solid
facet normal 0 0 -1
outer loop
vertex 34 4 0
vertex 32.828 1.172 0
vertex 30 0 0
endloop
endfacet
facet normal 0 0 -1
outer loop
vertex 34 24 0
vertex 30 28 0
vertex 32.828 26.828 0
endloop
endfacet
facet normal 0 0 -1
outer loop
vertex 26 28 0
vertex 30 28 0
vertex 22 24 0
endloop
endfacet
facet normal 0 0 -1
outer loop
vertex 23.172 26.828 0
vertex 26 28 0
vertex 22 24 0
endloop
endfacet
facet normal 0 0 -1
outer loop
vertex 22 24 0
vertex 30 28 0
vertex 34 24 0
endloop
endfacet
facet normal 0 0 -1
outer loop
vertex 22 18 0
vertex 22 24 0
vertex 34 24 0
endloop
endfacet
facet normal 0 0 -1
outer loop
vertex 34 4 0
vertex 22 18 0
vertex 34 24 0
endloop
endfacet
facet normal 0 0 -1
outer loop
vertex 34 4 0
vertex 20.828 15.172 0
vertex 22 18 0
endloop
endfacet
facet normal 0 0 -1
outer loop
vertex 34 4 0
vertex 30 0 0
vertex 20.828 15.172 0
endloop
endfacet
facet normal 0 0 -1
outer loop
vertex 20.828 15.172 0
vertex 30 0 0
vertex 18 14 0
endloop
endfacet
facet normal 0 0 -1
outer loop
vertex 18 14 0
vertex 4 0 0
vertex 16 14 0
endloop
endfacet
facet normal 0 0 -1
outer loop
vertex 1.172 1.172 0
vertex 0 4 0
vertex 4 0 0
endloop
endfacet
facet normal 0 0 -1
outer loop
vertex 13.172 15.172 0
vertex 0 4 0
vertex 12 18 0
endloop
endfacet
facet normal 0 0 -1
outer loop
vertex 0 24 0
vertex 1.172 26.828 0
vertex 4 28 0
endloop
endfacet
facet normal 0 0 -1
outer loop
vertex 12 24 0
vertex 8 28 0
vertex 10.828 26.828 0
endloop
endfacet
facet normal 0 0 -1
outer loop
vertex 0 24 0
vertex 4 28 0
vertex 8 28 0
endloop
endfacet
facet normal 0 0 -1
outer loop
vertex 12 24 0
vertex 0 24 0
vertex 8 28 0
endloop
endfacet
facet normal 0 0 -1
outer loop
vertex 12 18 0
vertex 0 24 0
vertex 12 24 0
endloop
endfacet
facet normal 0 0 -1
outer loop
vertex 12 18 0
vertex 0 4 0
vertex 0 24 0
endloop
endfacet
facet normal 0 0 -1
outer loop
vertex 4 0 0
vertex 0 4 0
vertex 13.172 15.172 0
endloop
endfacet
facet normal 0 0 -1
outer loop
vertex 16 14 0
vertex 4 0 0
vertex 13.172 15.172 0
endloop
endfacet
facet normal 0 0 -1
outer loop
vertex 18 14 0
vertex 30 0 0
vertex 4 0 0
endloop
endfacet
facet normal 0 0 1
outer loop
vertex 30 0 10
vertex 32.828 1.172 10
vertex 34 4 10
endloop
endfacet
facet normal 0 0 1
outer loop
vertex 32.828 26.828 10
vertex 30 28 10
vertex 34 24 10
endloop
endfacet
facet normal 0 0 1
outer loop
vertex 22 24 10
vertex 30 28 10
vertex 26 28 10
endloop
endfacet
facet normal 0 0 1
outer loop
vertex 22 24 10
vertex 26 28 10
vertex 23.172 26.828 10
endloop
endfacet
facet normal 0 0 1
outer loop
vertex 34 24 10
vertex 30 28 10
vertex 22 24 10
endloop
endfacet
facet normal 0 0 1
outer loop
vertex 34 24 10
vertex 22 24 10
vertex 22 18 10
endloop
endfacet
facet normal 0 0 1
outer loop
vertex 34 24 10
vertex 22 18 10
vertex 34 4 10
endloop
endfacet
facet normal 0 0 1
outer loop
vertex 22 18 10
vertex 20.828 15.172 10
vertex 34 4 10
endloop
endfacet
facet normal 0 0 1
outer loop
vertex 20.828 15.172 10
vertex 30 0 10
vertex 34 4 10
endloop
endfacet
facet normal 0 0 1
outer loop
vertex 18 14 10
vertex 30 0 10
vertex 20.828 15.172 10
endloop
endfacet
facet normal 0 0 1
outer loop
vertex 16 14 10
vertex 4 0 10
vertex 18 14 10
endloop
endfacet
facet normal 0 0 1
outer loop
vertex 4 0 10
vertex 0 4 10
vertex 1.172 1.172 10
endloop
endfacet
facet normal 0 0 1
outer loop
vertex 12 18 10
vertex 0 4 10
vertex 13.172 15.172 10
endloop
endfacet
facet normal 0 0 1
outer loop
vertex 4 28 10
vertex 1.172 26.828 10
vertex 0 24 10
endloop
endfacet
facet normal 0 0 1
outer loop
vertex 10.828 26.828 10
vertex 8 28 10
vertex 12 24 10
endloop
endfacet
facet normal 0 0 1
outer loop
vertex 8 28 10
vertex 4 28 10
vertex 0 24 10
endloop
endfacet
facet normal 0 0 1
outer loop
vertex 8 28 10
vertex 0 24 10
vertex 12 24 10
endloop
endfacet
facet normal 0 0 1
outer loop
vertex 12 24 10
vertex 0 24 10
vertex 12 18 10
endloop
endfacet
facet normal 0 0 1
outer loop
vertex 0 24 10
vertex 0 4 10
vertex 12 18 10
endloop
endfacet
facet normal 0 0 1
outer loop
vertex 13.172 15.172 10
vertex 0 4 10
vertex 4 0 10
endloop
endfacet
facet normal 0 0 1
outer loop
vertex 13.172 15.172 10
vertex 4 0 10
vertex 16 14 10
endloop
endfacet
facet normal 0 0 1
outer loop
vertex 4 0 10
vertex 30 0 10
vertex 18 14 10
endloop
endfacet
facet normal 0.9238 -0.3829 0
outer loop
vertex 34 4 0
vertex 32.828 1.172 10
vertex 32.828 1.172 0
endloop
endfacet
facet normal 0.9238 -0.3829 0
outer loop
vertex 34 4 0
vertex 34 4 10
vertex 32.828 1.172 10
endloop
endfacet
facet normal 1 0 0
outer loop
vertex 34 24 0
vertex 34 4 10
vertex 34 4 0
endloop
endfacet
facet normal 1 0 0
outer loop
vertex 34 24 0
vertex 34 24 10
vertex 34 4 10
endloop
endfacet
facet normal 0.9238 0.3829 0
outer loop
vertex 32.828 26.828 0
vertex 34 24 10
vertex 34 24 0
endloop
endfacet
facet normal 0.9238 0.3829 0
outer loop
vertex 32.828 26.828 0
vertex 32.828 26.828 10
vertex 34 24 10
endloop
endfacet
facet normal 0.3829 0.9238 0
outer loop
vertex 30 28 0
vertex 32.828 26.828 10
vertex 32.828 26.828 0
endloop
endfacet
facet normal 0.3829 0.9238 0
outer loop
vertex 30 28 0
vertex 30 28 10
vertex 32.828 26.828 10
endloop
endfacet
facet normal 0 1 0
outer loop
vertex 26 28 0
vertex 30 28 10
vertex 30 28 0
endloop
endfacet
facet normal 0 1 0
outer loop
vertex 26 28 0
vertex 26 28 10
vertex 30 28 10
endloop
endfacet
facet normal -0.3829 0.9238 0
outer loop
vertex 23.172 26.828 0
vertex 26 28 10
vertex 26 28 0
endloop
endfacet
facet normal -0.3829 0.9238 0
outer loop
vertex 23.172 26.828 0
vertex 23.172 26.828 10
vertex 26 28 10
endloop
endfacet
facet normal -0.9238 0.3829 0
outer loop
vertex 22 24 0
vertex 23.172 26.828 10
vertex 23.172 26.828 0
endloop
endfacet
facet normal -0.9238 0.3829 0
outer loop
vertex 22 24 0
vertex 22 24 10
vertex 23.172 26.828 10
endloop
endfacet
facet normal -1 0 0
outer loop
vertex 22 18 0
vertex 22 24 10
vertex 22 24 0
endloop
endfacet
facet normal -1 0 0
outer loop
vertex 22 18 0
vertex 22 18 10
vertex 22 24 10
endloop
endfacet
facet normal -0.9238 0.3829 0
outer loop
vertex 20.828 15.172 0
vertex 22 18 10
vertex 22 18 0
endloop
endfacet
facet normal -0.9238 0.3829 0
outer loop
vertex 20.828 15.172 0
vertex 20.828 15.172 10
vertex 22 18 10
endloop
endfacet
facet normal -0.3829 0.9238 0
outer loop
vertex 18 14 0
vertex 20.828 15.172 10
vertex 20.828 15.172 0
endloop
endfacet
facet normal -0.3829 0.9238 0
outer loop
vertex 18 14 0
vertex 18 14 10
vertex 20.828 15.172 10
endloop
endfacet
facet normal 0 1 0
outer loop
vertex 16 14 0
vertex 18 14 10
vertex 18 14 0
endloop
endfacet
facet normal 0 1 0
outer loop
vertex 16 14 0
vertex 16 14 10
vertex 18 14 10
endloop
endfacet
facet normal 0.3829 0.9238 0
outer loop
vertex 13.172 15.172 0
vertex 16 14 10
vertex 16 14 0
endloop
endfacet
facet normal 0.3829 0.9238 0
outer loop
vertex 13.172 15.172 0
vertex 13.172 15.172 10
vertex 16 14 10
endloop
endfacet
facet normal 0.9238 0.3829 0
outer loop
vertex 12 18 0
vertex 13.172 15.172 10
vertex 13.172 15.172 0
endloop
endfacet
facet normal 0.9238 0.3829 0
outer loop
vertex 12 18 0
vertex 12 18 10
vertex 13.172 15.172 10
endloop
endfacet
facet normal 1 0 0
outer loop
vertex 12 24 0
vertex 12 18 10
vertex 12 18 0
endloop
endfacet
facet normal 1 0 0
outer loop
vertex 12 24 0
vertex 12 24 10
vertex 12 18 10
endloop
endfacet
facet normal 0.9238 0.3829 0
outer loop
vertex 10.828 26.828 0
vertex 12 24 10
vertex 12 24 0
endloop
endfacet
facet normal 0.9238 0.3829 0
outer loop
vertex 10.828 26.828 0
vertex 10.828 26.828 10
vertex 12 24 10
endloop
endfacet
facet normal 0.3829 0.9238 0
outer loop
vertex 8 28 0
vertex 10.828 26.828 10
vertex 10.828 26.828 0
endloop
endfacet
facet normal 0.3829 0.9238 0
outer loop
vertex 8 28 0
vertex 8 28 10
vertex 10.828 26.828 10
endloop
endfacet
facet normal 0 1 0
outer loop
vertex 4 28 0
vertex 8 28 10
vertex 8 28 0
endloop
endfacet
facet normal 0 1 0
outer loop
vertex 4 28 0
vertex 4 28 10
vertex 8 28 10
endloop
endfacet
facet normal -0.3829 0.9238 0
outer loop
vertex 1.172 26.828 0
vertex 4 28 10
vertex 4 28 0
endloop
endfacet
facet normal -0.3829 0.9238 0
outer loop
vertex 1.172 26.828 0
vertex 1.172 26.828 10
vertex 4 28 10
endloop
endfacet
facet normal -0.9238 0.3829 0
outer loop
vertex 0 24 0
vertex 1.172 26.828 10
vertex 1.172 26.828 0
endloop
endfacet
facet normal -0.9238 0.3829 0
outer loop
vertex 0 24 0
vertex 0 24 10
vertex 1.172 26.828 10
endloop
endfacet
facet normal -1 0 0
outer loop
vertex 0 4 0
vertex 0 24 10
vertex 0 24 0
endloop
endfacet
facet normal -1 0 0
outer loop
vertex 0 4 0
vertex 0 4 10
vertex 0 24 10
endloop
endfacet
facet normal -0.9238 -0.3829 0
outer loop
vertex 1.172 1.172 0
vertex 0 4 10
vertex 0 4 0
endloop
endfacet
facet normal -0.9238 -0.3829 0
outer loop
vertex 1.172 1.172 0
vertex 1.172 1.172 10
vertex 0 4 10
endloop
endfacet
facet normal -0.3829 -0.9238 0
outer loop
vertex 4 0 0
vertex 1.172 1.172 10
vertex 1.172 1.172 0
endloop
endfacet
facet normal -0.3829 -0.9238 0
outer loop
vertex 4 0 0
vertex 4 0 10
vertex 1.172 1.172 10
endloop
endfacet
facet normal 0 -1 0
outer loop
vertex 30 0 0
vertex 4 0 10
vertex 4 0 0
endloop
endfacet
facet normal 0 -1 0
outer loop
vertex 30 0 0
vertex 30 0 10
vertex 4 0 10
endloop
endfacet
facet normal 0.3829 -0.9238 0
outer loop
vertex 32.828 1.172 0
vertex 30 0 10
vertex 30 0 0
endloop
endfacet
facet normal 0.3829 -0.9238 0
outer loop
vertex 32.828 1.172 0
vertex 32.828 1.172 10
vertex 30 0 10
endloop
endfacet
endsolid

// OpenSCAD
$fn = 32;

// ----------------------------------------------------------------------
// Eye lug: clevis, 10 mm thick
// ----------------------------------------------------------------------

// --- parameters (mm) ---
profile_height = 10;      // extrusion height
profile_points = 24;      // points of the closed outline

profile = [[0, 4], [1.172, 1.172], [4, 0], [30, 0], [32.828, 1.172], [34, 4], [34, 24], [32.828, 26.828], [30, 28], [26, 28], [23.172, 26.828], [22, 24], [22, 18], [20.828, 15.172], [18, 14], [16, 14], [13.172, 15.172], [12, 18], [12, 24], [10.828, 26.828], [8, 28], [4, 28], [1.172, 26.828], [0, 24]];  // single closed polygon, 24 points, counter clockwise

// --- the one profile operation ---
linear_extrude(height = profile_height) polygon(points = profile);
